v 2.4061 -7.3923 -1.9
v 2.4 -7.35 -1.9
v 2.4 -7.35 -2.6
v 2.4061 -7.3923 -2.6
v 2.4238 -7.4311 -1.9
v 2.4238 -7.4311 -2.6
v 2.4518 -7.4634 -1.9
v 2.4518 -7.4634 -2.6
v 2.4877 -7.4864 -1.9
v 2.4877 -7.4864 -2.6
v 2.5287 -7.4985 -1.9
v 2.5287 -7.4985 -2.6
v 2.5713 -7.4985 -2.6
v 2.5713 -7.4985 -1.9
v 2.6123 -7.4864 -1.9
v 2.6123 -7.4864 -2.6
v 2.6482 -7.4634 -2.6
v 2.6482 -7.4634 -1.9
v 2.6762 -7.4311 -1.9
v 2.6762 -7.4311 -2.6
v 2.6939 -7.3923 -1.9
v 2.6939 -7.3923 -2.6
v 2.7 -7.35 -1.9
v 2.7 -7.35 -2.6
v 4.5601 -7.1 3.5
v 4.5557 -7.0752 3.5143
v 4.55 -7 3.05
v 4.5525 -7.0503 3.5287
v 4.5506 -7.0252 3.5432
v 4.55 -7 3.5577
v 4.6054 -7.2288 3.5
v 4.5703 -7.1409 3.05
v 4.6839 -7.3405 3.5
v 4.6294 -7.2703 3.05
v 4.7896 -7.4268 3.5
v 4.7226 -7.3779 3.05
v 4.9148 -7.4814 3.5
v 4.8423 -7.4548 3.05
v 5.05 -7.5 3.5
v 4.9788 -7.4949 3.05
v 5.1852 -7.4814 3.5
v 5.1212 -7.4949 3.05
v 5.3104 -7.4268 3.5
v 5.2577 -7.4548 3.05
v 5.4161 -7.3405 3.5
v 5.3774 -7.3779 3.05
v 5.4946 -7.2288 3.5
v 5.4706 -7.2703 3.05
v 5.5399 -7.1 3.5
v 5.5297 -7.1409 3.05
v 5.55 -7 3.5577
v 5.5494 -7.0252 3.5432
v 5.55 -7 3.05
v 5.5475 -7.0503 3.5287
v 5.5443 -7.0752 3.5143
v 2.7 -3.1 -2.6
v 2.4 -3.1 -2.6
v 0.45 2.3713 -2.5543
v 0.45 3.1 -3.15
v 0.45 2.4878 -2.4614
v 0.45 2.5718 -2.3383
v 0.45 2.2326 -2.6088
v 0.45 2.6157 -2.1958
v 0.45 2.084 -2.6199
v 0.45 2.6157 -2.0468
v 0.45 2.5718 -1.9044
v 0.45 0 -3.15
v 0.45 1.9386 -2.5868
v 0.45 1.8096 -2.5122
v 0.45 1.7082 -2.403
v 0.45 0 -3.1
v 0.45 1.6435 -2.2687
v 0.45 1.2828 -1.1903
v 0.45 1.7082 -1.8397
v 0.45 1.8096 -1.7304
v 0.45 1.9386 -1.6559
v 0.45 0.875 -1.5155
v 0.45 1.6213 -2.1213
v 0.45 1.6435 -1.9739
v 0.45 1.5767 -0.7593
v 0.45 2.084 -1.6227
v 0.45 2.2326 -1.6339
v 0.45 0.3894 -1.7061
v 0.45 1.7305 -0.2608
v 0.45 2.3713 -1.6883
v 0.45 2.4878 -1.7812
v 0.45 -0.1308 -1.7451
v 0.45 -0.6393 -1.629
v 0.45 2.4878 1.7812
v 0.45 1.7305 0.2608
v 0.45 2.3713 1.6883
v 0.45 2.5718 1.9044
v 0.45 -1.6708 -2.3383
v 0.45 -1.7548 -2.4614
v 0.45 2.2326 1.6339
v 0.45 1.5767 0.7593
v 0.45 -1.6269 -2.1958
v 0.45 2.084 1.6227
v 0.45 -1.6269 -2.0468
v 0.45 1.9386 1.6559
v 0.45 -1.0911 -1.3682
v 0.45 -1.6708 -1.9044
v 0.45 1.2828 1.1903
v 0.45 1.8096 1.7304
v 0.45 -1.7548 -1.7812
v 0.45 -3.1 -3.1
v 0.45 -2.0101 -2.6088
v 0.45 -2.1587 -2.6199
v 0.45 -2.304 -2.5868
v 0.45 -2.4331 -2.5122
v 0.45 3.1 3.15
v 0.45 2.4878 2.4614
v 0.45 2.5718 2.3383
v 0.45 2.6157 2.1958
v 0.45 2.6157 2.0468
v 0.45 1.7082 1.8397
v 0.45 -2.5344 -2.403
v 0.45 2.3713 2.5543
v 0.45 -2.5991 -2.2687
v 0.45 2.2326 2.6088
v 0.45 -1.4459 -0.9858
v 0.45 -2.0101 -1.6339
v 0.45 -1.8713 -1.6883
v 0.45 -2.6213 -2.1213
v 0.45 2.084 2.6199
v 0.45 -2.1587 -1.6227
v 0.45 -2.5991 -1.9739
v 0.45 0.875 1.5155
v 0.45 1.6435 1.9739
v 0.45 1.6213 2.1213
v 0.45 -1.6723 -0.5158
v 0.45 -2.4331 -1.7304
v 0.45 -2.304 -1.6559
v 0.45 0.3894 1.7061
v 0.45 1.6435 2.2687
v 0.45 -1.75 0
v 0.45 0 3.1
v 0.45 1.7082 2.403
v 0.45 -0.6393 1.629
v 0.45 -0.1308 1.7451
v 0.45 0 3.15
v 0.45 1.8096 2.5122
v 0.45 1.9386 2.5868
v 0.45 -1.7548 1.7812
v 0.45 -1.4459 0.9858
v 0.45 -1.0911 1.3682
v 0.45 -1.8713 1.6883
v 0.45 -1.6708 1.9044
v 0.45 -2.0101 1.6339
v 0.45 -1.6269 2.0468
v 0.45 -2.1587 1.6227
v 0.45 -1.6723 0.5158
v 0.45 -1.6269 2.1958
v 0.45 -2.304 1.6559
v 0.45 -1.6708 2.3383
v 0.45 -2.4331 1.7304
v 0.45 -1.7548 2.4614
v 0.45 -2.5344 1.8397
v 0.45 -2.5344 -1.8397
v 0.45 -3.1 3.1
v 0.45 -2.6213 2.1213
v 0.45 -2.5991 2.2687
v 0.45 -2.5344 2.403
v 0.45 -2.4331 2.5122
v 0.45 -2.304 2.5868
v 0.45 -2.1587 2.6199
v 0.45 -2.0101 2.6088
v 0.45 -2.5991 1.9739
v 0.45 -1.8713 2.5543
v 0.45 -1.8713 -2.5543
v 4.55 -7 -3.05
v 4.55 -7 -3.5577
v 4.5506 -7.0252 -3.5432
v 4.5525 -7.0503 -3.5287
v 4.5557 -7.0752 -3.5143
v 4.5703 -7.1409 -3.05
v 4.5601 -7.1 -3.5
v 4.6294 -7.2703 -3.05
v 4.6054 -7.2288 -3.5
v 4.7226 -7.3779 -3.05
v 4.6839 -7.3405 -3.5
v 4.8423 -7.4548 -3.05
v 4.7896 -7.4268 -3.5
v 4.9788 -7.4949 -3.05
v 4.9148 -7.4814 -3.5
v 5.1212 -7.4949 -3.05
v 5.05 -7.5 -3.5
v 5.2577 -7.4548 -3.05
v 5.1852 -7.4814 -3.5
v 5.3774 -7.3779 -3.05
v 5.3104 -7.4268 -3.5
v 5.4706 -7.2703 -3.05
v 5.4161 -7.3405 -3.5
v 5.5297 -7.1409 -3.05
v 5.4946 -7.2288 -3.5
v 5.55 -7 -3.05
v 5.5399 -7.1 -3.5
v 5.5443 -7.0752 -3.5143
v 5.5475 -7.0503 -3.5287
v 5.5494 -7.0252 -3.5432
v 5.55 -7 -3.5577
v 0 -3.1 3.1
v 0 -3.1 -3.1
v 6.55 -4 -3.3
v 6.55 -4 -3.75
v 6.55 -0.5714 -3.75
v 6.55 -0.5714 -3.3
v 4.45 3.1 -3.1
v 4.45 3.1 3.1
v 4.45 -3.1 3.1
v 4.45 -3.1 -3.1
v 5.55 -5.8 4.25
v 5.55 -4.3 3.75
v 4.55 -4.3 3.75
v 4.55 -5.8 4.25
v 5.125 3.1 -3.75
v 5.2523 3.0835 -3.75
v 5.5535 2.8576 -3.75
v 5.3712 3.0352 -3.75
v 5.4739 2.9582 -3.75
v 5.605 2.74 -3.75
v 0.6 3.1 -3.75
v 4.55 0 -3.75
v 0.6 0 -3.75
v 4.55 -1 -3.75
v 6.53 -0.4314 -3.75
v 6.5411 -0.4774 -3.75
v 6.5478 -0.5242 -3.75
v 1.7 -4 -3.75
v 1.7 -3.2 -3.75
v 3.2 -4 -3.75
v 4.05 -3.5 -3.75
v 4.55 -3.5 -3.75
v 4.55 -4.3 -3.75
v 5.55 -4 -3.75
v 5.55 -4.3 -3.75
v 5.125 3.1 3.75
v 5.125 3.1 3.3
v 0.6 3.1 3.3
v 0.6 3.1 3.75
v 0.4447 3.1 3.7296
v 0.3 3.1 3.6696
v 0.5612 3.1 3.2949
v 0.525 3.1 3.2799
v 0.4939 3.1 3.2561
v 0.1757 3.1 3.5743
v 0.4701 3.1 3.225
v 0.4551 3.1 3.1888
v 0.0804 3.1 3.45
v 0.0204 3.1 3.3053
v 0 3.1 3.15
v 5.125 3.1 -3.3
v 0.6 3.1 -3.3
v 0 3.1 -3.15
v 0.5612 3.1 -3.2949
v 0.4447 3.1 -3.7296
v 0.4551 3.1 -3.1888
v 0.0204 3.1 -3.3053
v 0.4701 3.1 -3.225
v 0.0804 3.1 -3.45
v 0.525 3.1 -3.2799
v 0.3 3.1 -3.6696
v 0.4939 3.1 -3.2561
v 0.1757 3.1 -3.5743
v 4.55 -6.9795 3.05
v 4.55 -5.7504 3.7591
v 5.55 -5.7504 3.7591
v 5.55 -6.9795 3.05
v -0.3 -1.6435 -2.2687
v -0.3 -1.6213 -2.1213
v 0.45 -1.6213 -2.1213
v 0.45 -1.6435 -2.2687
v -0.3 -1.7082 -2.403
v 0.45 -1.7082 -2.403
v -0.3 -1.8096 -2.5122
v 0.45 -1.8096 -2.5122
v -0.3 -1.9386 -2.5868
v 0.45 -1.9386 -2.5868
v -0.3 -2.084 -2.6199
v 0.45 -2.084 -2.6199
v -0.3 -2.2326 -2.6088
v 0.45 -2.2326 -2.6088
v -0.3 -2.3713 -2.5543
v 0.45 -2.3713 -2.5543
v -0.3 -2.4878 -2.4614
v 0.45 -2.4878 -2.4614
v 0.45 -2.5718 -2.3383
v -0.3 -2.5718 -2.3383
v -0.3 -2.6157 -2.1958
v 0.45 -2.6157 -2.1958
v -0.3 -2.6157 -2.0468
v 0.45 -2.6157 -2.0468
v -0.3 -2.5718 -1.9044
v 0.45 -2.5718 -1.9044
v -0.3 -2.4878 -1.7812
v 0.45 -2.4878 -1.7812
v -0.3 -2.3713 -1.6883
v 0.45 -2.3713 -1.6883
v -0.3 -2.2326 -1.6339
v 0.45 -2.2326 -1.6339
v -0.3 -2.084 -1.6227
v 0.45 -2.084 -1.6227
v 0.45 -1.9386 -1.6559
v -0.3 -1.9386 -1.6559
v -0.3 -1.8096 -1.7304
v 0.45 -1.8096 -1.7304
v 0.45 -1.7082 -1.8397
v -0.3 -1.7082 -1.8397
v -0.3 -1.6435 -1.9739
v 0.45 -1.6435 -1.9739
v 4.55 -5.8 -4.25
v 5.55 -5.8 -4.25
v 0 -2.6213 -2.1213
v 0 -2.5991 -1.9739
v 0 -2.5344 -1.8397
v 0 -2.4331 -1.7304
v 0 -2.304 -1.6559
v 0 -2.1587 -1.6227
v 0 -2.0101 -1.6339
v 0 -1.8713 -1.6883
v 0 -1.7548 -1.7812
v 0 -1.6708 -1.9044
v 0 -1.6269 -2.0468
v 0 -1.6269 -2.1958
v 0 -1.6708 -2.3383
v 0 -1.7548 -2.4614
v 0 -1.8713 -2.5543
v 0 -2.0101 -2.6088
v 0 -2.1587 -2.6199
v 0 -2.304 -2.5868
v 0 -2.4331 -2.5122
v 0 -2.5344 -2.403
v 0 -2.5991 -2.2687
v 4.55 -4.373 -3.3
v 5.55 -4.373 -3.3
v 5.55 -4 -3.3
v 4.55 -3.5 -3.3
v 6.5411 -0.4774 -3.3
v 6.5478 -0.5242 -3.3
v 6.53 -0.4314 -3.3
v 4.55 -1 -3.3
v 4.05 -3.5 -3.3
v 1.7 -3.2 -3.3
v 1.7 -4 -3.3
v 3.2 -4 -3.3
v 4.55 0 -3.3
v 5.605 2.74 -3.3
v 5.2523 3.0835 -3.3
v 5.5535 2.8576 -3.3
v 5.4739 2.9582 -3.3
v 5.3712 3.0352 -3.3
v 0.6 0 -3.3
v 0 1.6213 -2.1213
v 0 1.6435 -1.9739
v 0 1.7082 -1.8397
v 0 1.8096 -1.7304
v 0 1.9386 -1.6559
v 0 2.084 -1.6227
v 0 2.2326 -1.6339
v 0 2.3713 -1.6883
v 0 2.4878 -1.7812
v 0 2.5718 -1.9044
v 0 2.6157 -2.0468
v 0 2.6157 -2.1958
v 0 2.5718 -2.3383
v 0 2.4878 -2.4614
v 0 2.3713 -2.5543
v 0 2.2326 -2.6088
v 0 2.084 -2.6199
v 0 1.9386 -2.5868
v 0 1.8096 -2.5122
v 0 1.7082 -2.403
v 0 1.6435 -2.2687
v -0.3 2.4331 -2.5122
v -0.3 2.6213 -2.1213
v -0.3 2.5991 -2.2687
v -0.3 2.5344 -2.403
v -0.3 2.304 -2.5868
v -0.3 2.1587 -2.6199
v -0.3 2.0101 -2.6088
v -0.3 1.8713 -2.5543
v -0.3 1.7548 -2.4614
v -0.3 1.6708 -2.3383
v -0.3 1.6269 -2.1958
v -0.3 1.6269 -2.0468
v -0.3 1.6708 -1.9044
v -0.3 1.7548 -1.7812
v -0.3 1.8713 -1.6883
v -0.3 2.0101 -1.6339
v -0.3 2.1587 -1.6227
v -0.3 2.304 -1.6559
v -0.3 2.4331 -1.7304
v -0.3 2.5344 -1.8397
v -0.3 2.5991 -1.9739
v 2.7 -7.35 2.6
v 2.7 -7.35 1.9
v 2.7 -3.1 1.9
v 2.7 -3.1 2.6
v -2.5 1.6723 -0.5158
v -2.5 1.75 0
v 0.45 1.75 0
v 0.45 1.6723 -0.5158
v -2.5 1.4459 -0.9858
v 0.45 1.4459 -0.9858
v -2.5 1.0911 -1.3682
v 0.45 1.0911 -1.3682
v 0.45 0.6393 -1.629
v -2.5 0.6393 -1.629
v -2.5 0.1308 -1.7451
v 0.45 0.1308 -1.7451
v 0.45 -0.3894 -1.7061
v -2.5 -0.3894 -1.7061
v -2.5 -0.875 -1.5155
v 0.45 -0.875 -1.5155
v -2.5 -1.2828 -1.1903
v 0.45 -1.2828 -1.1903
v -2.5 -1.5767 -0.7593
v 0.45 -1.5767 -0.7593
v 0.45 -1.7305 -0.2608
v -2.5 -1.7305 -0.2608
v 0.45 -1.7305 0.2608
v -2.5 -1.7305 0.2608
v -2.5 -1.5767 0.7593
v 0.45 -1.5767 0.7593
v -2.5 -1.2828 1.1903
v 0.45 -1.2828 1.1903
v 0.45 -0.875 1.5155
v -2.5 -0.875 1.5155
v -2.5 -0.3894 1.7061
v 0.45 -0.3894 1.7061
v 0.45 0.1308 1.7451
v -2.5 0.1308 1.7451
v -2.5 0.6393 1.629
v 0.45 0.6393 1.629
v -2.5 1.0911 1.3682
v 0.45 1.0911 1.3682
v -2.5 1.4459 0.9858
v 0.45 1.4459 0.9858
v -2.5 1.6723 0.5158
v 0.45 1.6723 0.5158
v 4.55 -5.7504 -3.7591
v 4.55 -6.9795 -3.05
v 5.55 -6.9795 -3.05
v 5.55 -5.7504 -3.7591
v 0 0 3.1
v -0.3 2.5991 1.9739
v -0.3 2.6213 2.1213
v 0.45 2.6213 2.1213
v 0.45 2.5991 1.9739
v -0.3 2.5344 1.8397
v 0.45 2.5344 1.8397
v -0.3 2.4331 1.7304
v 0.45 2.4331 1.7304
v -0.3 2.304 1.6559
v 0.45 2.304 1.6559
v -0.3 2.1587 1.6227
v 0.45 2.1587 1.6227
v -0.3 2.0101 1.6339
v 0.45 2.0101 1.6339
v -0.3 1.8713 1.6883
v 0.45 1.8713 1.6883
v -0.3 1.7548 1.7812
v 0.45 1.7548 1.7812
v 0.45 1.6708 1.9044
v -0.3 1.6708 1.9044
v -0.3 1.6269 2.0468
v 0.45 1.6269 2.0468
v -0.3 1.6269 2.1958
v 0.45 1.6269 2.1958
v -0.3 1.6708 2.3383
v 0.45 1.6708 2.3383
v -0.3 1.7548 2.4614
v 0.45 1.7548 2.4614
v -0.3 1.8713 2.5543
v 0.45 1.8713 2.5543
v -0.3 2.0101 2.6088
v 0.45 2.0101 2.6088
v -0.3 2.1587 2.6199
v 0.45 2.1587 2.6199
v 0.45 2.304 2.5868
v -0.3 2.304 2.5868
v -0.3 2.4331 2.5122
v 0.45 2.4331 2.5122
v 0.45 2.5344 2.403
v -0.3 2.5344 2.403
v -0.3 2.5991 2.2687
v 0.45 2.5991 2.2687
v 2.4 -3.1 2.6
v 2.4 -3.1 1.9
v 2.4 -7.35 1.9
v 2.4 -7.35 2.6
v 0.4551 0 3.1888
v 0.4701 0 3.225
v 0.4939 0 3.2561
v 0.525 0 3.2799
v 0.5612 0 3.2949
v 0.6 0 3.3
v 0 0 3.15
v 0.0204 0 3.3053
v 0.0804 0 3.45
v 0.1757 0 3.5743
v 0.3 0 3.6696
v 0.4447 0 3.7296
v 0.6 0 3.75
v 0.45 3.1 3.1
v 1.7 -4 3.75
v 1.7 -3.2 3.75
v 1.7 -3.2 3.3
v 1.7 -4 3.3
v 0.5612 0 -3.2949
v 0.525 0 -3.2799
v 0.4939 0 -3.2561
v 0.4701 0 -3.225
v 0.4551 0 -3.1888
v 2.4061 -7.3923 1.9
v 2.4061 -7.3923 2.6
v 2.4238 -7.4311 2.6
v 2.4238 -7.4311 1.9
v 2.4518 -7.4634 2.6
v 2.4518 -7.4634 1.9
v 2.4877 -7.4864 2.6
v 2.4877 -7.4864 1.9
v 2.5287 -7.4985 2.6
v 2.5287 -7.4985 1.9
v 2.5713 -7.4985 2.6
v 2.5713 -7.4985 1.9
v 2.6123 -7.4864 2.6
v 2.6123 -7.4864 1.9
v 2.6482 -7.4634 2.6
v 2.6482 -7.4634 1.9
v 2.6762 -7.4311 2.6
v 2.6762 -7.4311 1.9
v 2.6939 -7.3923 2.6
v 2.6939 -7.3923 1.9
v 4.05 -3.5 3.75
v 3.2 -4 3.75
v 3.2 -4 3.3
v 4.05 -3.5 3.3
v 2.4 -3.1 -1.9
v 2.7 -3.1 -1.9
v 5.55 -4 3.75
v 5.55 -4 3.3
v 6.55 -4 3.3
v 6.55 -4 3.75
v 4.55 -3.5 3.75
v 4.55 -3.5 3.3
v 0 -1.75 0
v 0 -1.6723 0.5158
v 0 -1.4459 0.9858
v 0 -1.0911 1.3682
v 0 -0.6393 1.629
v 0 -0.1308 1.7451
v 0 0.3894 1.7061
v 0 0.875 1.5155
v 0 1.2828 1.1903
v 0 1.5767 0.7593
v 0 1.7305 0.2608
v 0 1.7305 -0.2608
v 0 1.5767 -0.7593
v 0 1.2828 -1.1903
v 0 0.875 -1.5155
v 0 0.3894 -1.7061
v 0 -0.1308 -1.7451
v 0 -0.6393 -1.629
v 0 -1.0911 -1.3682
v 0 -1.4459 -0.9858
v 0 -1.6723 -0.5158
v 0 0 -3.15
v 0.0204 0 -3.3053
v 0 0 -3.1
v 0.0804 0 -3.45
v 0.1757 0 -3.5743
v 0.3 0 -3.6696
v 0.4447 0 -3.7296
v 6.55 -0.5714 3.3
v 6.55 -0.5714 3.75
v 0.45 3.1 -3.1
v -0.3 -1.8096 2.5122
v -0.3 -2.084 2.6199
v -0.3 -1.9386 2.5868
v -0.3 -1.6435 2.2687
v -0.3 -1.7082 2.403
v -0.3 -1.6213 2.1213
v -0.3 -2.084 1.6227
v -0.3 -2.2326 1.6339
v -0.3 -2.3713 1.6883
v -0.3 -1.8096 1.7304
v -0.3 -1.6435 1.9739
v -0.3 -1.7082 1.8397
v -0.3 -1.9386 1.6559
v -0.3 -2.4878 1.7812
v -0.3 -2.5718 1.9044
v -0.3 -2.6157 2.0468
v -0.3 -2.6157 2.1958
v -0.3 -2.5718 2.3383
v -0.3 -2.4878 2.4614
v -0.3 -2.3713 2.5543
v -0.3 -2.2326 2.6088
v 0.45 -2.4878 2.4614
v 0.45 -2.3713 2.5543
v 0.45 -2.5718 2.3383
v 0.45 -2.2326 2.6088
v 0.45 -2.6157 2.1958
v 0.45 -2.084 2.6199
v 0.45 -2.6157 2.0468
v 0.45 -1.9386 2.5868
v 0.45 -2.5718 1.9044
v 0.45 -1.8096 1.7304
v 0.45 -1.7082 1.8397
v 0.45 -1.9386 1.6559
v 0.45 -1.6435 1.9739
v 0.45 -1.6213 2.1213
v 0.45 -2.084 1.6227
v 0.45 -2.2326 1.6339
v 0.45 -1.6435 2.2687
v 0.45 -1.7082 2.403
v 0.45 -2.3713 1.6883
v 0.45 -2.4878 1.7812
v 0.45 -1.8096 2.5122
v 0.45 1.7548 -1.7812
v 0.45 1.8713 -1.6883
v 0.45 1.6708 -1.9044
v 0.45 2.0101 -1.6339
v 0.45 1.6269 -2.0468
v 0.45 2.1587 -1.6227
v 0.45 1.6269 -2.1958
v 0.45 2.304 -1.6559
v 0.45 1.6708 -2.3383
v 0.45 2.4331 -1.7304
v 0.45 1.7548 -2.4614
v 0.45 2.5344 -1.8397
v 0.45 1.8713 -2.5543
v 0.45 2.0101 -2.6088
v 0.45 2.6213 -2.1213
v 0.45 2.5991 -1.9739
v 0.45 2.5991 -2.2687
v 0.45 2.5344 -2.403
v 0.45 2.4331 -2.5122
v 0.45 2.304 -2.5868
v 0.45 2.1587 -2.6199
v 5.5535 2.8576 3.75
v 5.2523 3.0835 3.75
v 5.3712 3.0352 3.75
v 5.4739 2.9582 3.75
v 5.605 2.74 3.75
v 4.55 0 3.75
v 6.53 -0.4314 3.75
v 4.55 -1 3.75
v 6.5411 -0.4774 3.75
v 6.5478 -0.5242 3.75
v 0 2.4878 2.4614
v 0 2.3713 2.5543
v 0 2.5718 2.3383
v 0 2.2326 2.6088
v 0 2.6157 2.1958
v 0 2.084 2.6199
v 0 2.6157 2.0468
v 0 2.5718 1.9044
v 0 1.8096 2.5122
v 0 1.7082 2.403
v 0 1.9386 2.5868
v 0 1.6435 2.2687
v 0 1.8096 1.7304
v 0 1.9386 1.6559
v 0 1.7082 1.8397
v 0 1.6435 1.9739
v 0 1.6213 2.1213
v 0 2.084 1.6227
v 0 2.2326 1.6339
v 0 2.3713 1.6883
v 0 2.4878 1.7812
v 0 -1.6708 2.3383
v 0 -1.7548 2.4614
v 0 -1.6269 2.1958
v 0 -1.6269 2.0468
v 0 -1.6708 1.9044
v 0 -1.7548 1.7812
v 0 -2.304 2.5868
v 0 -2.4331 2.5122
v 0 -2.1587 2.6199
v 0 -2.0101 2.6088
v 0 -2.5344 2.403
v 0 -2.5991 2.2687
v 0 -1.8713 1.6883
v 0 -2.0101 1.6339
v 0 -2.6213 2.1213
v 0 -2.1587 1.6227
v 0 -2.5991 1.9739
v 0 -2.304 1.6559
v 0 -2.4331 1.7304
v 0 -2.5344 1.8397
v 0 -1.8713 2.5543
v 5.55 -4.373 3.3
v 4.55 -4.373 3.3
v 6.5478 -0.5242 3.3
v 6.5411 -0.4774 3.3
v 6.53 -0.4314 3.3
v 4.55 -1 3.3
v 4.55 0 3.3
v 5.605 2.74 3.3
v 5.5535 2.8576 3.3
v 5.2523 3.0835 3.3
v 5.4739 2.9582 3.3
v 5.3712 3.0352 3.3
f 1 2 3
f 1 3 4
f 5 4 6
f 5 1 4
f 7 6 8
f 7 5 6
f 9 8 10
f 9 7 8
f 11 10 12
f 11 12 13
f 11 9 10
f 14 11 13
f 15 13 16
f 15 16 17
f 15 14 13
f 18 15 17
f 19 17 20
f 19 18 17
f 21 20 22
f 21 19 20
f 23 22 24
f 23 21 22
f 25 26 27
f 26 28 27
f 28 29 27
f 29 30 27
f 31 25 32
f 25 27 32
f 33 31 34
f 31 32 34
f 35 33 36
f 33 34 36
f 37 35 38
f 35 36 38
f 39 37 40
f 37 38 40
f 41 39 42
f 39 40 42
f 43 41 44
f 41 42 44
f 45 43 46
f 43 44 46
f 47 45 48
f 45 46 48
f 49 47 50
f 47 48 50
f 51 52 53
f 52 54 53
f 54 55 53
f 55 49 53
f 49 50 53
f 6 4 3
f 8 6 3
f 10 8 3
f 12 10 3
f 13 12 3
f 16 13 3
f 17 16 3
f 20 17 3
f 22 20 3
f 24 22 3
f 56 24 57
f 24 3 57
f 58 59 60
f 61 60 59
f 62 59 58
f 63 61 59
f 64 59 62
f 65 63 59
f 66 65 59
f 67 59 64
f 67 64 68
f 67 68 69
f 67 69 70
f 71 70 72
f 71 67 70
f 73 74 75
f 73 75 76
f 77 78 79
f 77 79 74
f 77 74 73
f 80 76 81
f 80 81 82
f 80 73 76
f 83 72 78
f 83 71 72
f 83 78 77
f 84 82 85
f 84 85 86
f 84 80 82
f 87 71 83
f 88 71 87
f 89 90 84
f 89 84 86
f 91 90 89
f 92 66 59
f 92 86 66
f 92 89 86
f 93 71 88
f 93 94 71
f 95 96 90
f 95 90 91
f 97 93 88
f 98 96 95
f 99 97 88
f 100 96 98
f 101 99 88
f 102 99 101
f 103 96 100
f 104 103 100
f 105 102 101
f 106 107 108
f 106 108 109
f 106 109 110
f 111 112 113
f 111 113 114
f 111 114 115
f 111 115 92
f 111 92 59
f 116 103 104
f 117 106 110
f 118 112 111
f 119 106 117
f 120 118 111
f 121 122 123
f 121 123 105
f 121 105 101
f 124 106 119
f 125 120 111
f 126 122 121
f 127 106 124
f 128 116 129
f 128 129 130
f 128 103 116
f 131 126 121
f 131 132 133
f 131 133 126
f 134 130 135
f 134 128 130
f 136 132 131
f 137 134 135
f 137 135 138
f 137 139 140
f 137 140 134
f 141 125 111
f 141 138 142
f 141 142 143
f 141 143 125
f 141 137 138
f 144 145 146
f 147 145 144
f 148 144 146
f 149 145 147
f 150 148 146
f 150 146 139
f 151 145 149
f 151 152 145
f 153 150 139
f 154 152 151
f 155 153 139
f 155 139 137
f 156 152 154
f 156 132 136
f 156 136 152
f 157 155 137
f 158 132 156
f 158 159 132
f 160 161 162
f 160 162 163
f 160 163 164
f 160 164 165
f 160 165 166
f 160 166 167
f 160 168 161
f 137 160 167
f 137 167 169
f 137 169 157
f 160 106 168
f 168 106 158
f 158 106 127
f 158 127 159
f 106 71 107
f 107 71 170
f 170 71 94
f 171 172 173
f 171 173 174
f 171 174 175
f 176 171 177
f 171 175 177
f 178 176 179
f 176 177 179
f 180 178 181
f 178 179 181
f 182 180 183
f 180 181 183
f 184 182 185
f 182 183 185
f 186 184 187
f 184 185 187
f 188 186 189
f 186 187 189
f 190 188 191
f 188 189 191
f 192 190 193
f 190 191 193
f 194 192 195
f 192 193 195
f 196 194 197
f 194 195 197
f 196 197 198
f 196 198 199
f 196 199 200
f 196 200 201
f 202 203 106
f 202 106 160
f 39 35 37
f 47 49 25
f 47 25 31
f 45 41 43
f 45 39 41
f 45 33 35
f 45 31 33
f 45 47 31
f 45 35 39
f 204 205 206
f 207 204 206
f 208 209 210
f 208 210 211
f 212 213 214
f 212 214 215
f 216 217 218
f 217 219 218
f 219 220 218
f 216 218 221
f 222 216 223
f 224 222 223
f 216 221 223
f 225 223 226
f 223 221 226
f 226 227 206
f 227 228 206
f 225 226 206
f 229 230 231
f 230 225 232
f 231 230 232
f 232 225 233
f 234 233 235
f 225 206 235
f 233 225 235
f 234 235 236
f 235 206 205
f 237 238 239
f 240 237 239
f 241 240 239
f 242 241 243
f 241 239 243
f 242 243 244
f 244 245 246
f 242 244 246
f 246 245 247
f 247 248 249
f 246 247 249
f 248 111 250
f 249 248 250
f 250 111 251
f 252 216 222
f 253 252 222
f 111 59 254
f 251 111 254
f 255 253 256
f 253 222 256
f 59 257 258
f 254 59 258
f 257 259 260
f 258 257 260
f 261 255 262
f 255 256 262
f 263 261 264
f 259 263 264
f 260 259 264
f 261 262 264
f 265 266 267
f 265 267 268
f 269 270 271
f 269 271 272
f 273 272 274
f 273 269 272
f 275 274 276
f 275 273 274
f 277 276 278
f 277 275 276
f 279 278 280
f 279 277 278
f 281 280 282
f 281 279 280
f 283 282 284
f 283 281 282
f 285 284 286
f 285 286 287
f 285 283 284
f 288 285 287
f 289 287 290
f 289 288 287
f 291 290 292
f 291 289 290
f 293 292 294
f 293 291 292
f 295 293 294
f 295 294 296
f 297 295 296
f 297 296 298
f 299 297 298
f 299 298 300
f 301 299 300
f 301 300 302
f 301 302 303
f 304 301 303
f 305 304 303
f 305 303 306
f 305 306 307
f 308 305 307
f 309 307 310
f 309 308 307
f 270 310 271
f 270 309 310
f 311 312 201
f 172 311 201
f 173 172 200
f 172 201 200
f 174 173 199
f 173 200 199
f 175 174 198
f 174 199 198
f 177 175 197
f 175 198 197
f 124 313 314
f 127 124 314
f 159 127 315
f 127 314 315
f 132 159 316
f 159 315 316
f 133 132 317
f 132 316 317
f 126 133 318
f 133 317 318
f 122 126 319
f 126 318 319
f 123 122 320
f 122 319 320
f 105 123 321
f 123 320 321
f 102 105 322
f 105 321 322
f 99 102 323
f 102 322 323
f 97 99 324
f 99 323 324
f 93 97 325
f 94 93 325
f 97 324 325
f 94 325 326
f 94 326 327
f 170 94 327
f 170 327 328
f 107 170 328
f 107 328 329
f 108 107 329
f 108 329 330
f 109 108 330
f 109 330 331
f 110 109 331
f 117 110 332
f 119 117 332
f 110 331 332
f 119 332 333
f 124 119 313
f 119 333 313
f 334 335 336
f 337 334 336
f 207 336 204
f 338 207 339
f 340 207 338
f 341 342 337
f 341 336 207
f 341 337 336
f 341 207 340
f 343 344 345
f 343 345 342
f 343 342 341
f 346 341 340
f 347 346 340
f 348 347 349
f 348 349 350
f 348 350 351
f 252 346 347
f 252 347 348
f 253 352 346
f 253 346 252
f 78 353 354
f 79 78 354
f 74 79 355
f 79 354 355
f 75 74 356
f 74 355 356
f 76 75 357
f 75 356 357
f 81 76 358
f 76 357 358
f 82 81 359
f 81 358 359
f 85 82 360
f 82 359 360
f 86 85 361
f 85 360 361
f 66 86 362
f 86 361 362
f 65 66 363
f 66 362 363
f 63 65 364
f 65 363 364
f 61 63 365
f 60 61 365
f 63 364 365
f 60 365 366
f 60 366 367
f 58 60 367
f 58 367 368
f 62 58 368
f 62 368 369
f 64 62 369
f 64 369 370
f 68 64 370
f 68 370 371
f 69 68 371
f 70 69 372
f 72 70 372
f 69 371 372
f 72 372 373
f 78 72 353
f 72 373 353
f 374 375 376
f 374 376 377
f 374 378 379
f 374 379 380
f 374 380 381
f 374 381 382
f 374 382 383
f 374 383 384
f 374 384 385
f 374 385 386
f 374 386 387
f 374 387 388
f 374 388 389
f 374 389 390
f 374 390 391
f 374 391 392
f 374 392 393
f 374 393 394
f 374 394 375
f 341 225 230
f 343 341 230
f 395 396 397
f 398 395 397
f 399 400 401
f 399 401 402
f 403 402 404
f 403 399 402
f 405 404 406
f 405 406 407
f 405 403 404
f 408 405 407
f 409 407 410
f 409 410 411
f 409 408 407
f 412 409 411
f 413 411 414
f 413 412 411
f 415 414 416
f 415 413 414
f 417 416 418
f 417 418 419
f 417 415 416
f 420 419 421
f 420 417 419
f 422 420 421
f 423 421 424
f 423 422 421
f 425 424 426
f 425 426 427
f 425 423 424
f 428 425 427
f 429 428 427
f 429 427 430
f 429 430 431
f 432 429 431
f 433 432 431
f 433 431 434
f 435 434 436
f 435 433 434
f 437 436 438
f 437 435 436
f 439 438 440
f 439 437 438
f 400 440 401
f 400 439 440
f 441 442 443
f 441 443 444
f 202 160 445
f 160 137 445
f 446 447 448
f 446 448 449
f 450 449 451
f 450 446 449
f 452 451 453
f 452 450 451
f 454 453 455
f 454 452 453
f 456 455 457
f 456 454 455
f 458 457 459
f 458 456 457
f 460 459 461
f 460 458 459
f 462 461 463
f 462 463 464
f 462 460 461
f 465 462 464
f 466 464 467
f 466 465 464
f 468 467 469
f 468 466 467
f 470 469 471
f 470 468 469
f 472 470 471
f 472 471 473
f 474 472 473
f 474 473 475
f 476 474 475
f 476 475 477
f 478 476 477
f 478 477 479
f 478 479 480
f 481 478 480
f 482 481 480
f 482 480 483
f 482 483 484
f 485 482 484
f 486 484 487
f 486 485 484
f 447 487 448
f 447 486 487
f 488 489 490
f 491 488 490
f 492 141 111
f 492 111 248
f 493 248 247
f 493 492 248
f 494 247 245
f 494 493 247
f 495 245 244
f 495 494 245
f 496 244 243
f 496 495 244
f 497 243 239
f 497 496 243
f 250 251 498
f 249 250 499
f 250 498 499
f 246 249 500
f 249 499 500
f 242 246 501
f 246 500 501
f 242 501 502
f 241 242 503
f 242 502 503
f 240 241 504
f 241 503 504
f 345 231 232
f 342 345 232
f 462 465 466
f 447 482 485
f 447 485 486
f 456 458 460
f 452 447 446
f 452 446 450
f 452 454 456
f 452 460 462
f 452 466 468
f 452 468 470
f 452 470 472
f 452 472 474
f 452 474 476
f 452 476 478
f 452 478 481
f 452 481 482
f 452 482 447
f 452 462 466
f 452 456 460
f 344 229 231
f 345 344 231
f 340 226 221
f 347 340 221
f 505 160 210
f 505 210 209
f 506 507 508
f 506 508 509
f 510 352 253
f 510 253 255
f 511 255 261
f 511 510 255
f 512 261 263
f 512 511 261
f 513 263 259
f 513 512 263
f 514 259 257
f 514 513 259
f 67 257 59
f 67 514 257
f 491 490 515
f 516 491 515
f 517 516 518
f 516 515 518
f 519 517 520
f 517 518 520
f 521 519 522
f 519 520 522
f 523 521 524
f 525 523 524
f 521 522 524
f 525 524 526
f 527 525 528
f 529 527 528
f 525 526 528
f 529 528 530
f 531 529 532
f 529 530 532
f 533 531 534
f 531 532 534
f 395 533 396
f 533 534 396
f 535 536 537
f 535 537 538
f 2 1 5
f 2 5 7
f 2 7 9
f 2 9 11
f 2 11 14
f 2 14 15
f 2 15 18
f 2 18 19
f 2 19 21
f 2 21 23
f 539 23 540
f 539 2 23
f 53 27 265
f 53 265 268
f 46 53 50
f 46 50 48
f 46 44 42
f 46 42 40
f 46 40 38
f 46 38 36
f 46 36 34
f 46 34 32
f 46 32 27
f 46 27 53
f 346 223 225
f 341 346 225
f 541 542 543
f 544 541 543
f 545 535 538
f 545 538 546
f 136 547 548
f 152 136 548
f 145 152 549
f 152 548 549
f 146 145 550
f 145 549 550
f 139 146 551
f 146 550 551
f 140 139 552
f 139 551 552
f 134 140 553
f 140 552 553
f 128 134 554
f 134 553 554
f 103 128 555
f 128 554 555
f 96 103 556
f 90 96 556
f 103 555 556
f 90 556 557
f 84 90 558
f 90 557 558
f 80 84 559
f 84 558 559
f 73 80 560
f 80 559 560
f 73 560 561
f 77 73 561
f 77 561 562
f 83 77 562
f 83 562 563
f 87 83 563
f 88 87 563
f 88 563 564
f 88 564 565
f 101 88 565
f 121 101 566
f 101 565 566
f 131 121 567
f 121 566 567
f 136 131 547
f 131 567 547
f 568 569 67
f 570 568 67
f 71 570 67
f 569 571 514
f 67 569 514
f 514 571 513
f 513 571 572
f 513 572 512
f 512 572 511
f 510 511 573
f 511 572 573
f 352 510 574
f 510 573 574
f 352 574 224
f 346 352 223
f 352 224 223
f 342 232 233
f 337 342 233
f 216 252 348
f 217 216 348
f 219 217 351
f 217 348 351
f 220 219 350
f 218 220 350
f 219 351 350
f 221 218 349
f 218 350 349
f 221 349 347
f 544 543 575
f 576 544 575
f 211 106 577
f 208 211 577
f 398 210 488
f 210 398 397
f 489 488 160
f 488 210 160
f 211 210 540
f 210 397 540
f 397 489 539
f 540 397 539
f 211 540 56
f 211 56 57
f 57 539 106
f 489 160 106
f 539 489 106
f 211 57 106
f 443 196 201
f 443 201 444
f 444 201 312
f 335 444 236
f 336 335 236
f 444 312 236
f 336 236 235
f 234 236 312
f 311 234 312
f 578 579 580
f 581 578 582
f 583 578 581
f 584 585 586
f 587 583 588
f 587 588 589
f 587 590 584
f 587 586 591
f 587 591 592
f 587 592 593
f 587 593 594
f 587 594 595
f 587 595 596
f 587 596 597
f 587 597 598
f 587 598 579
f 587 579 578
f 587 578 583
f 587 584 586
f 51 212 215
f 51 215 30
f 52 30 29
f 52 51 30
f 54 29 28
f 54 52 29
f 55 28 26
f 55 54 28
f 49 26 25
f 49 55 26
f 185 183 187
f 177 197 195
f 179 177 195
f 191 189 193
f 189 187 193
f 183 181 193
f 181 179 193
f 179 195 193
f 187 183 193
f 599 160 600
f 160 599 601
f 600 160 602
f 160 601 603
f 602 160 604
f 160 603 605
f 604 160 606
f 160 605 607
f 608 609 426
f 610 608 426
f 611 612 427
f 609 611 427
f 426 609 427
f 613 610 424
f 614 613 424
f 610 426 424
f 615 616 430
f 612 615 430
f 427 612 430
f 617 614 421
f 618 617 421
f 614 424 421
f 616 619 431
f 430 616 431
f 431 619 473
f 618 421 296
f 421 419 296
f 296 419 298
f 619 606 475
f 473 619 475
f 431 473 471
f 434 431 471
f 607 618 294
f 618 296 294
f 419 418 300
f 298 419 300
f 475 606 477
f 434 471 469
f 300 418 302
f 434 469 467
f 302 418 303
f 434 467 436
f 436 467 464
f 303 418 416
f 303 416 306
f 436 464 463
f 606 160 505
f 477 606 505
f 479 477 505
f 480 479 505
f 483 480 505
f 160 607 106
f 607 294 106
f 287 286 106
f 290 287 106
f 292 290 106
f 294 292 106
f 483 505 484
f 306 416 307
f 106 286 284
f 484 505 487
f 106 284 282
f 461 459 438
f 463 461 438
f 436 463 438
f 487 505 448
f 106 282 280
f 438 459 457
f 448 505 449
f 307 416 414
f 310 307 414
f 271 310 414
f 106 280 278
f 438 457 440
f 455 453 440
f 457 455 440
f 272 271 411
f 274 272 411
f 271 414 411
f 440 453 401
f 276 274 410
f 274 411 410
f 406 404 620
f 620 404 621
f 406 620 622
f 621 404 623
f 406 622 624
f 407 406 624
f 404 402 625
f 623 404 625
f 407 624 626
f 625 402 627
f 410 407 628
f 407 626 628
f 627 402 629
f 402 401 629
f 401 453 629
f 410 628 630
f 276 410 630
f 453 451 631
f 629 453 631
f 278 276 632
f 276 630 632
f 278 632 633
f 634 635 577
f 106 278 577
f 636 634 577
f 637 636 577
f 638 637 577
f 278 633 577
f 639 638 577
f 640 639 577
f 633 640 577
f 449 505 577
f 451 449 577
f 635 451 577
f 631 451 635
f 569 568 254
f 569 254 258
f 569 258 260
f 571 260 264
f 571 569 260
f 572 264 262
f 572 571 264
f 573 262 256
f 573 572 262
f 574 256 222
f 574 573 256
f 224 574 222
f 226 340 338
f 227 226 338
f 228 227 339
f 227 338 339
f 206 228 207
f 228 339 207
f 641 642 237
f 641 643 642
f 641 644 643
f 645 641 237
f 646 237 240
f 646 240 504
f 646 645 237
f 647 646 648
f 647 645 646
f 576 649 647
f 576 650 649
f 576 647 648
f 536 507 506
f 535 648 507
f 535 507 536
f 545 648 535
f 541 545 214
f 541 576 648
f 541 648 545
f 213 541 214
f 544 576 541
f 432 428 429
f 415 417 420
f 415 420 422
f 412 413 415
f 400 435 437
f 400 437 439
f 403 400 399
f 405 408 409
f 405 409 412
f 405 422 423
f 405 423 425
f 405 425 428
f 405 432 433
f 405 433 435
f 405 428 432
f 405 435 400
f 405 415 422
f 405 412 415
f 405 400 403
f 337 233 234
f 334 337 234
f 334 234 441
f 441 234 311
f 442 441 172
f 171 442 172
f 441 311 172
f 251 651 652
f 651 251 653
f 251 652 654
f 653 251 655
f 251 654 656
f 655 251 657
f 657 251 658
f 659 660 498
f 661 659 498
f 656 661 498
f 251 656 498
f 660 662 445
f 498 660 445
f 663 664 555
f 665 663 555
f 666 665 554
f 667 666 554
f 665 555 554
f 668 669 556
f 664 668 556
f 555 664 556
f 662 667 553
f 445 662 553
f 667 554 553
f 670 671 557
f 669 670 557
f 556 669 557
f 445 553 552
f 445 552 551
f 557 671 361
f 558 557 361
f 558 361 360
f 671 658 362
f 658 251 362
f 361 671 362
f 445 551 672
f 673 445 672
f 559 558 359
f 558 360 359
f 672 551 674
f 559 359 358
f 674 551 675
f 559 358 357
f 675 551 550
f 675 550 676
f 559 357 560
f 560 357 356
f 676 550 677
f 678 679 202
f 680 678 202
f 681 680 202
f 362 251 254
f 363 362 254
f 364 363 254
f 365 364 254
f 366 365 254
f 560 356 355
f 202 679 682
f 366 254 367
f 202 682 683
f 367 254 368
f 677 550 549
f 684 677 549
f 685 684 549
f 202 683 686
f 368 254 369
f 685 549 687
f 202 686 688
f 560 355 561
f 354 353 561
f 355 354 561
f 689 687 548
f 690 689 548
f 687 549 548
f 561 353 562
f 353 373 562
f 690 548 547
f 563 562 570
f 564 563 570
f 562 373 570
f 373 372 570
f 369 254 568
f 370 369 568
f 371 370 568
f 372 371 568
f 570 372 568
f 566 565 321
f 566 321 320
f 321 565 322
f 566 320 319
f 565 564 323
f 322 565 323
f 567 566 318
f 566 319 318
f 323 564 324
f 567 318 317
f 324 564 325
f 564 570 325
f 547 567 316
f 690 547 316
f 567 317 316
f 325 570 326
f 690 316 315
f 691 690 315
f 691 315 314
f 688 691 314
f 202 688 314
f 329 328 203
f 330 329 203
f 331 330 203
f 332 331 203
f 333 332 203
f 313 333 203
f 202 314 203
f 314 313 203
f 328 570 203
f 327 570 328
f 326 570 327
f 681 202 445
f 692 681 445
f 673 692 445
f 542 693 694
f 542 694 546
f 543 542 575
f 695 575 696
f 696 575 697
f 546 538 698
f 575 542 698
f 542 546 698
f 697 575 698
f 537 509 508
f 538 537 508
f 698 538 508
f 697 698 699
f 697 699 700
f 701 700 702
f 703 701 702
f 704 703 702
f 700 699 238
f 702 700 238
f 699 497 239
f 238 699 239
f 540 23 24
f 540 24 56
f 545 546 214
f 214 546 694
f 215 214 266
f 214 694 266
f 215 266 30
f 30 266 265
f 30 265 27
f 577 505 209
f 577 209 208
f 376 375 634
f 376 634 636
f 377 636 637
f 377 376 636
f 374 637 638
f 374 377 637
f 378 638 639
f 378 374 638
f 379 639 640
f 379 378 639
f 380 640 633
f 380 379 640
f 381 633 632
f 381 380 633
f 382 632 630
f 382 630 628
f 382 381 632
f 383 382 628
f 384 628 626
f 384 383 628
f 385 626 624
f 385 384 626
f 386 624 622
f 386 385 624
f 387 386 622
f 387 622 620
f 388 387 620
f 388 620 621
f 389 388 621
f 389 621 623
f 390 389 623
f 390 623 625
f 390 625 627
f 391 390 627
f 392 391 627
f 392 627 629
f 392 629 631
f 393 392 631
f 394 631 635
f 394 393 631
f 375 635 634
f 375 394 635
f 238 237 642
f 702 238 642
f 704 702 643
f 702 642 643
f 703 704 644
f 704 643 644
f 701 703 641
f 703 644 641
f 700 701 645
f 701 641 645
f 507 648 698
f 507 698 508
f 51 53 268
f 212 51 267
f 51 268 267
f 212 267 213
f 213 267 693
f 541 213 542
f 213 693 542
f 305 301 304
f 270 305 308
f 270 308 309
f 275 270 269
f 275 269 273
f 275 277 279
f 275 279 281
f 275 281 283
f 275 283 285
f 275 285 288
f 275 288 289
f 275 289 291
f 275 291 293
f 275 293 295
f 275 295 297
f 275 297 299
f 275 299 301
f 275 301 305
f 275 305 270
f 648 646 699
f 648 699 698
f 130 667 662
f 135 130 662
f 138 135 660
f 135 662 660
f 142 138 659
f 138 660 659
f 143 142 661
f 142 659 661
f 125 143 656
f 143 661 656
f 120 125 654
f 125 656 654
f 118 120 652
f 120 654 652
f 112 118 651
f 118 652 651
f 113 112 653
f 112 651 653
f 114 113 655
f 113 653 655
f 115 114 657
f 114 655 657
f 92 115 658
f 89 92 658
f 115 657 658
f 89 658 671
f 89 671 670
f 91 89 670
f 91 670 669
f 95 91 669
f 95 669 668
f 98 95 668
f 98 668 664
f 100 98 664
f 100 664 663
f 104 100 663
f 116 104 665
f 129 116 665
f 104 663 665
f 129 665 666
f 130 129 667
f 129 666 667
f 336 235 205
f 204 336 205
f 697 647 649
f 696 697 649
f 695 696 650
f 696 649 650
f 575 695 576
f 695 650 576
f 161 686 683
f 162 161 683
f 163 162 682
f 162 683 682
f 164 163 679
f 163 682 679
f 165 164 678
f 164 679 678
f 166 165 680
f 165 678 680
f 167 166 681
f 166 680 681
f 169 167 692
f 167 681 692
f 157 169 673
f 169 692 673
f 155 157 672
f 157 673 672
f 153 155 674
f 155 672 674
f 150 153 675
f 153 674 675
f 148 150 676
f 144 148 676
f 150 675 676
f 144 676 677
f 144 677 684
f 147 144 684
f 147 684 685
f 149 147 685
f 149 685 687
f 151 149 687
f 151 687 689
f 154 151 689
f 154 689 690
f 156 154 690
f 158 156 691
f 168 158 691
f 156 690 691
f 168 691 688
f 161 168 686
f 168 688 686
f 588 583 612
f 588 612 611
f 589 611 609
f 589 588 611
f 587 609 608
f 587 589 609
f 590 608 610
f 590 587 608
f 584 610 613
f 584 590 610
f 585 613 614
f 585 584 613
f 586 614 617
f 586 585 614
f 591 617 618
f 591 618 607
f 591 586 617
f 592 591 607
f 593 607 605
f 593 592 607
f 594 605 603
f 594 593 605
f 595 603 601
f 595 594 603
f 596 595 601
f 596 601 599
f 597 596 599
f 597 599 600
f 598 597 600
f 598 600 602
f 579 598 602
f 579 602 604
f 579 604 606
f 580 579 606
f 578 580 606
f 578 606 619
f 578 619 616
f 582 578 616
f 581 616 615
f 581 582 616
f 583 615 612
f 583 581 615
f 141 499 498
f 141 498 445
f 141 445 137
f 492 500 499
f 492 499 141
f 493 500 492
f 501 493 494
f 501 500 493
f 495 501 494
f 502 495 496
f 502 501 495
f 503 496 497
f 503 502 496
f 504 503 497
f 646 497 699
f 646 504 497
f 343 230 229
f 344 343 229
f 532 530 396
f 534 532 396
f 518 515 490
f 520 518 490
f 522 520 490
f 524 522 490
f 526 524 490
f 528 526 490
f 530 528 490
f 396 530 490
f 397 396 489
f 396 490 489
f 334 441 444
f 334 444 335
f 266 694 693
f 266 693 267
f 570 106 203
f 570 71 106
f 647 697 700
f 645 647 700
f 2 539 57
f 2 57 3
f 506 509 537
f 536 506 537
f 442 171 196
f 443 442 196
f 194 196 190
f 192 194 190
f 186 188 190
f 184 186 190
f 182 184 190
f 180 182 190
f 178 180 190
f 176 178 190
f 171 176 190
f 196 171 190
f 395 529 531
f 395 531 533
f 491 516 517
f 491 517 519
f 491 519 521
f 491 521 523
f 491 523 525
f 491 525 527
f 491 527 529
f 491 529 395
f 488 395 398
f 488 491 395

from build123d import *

# Parameters (mm, degrees)
EXTRUDE_1_DEPTH      = 10
EXTRUDE_1_DEPTH_BACK = 10
CUT_EXTRUDE_1_DEPTH  = 15.112140164
FILLET_1_R           = 0.6
FILLET_2_R           = 0.5
SHELL_START          = 0.6
SHELL_1_OUTLINE_W    = 7.1
SHELL_1_OUTLINE_H    = 6.6
SHELL_1_DEPTH        = 5.95
SHELL_START_2        = -8
SHELL_1_2_OUTLINE_W  = 1
SHELL_1_2_OUTLINE_H  = 6.1
SHELL_1_2_DEPTH      = 11.1
SHELL_START_3        = 4.55
SHELL_1_3_DEPTH      = 1
CUT_EXTRUDE_2_DEPTH  = 0.65
SKETCH_5_R           = 0.5
SKETCH_5_R_2         = 1.75
SKETCH_5_W           = 10
SKETCH_5_H           = 2
CUT_EXTRUDE_3_DEPTH  = 0.45
SKETCH_6_W           = 6.2
SKETCH_6_H           = 6.2
EXTRUDE_2_DEPTH      = 4
SKETCH_7_W           = 0.7
SKETCH_7_H           = 5
EXTRUDE_1_2_DEPTH    = 4
SKETCH_8_OUTSIDE_W   = 11.61
SKETCH_8_OUTSIDE_H   = 15.96
CUT_EXTRUDE_4_DEPTH  = 4
EXTRUDE_START        = 0.75
SKETCH_9_R           = 0.5
EXTRUDE_3_DEPTH      = 0.75
EXTRUDE_START_2      = 2.95
SKETCH_9_4_R         = 1.75
EXTRUDE_4_DEPTH      = 2.95


with BuildPart() as part:
    # 草图1 → Extrude 1 (new, two sides: drawn at the far end of the back side and taken through both)
    with BuildSketch(Plane.XY.offset(-EXTRUDE_1_DEPTH_BACK)):
        with BuildLine():
            Line((0, 3.1), (0, -3.1))
            Line((0, -3.1), (0, -4))
            Line((0, -4), (2.4, -4))
            Line((2.4, -4), (2.7, -4))
            Line((2.7, -4), (4.55, -4))
            Line((4.55, -4), (4.55, -7))
            ThreePointArc((4.55, -7), (5.05, -7.5), (5.55, -7))
            Line((5.55, -7), (5.55, -4))
            Line((5.55, -4), (6.55, -4))
            Line((6.55, -4), (6.55, -0.5))
            Line((6.55, -0.5), (5.5, 3.1))
            Line((5.5, 3.1), (0, 3.1))
        make_face()
    extrude(amount=EXTRUDE_1_DEPTH + EXTRUDE_1_DEPTH_BACK)

    # 草图2 → 切除-拉伸1 (cut, symmetric)
    with BuildSketch(Plane(origin=(0, 0, 0), x_dir=(0, 0, -1), z_dir=(1, 0, 0))):
        Polygon((3.75, 49.345660633), (3.75, 3.778219056), (3.75, -4.3), (4.25, -5.8), (3.5, -7.1), (3.5, -7.992367687), (3.5, -53.559809264), (94.634614214, -53.781212981), (94.884614214, 49.124256916), align=None)
    cut_extrude_1 = extrude(amount=CUT_EXTRUDE_1_DEPTH, both=True, mode=Mode.SUBTRACT)

    # 镜向1: 切除-拉伸1 across plane
    add(cut_extrude_1.mirror(Plane.XY), mode=Mode.SUBTRACT)

    # 圆角1
    fillet_1_edges = [part.edges().sort_by_distance(p)[0] for p in [
        (0, -0.45, -3.75),
        (0, -0.45, 3.75),
    ]]
    fillet(fillet_1_edges, radius=FILLET_1_R)

    # 圆角2
    fillet_2_edges = [part.edges().sort_by_distance(p)[0] for p in [
        (6.55, -0.5, 0),
        (5.5, 3.1, 0),
    ]]
    fillet(fillet_2_edges, radius=FILLET_2_R)

    # 抽壳1: read off the stored shape, not the designer's step
    # 抽壳1 outline → 抽壳1 (cut)
    with BuildSketch(Plane.YZ.offset(SHELL_START)):
        with Locations((-0.45, 0)):
            Rectangle(SHELL_1_OUTLINE_W, SHELL_1_OUTLINE_H)
    extrude(amount=SHELL_1_DEPTH, mode=Mode.SUBTRACT)

    # Shell 1 2 outline → Shell 1 2 (cut)
    with BuildSketch(Plane(origin=(0, 0, 0), x_dir=(1, 0, 0), z_dir=(0, 1, 0)).offset(SHELL_START_2)):
        with BuildLine():
            ThreePointArc((0.6, 3.3), (0.493933983, 3.256066017), (0.45, 3.15))
            Line((0.45, 3.15), (0.45, -3.15))
            ThreePointArc((0.45, -3.15), (0.493933983, -3.256066017), (0.6, -3.3))
            Line((0.6, -3.3), (0.6, 3.3))
        make_face()
        with Locations((5.05, 0)):
            Rectangle(SHELL_1_2_OUTLINE_W, SHELL_1_2_OUTLINE_H)
    extrude(amount=SHELL_1_2_DEPTH, mode=Mode.SUBTRACT)

    # Shell 1 3 outline → Shell 1 3 (cut)
    with BuildSketch(Plane.YZ.offset(SHELL_START_3)):
        Polygon((-6.979500139, -3.05), (-5.750368378, -3.759114477), (-4.373024947, -3.3), (-4, -3.3), (-4, -3.05), align=None)
        Polygon((-4.373024947, 3.3), (-5.750368378, 3.759114477), (-6.979500139, 3.05), (-4, 3.05), (-4, 3.3), align=None)
    extrude(amount=SHELL_1_3_DEPTH, mode=Mode.SUBTRACT)

    # 草图4 → 切除-拉伸2 (cut)
    with BuildSketch(Plane.XY.offset(3.75)):
        Polygon((-1.45, 0), (4.55, 0), (4.55, -1), (1.7, -3.2), (1.7, -4), (3.2, -4), (4.05, -3.5), (4.55, -3.5), (4.55, -9.5), (-1.45, -9.5), align=None)
    cut_extrude_2 = extrude(amount=-CUT_EXTRUDE_2_DEPTH, mode=Mode.SUBTRACT)

    # 镜向2: 切除-拉伸2 across plane
    add(cut_extrude_2.mirror(Plane.XY), mode=Mode.SUBTRACT)

    # 草图5 → 切除-拉伸3 (cut)
    with BuildSketch(Plane.ZY):
        with Locations(Location((-2.121320344, 2.121320344, 0), (0, 0, 270))):
            Circle(SKETCH_5_R)
        with Locations(Location((2.121320344, 2.121320344, 0), (0, 0, 270))):
            Circle(SKETCH_5_R)
        with Locations(Location((2.121320344, -2.121320344, 0), (0, 0, 270))):
            Circle(SKETCH_5_R)
        with Locations(Location((-2.121320344, -2.121320344, 0), (0, 0, 270))):
            Circle(SKETCH_5_R)
        with Locations(Location((0, 0, 0), (0, 0, 270))):
            Circle(SKETCH_5_R_2)
        with Locations((0, -4.1)):
            Rectangle(SKETCH_5_W, SKETCH_5_H)
    extrude(amount=-CUT_EXTRUDE_3_DEPTH, mode=Mode.SUBTRACT)


with BuildPart() as body_2:
    # 草图6 → 凸台-拉伸2 (new body)
    with BuildSketch(Plane(origin=(0.45, 0, 0), x_dir=(0, 0, -1), z_dir=(1, 0, 0))):
        Rectangle(SKETCH_6_W, SKETCH_6_H)
    extrude(amount=EXTRUDE_2_DEPTH)


with BuildPart() as body_3:
    # 草图7 → Extrude 1 2 (new body)
    with BuildSketch(Plane(origin=(0, 0, 0), x_dir=(0, 0, -1), z_dir=(1, 0, 0))):
        with Locations((2.25, -5.3)):
            Rectangle(SKETCH_7_W, SKETCH_7_H)
    extrude(amount=EXTRUDE_1_2_DEPTH)

    # 草图8 outside → 切除-拉伸4 (cut)
    with BuildSketch(Plane.XY):
        with Locations((3.275, -2.35)):
            Rectangle(SKETCH_8_OUTSIDE_W, SKETCH_8_OUTSIDE_H)
        with BuildLine():
            Line((2.7, -7.35), (2.7, -1.755439518))
            Line((2.7, -1.755439518), (2.4, -1.755439518))
            Line((2.4, -1.755439518), (2.4, -7.35))
            ThreePointArc((2.4, -7.35), (2.55, -7.5), (2.7, -7.35))
        make_face(mode=Mode.SUBTRACT)
    extrude(amount=-CUT_EXTRUDE_4_DEPTH, mode=Mode.SUBTRACT)


with BuildPart() as body_4:
    # 镜向3: mirrored copy
    add(body_3.part.mirror(Plane.XY))


with BuildPart() as body_3_1:
    add(body_3.part)

    # Combine 1: union body 4, body 2
    add(body_4.part)
    add(body_2.part)

    # 草图9 → 凸台-拉伸3 (add)
    with BuildSketch(Plane.ZY.offset(-0.45).offset(EXTRUDE_START)):
        with Locations(Location((-2.121320344, 2.121320344, 0), (0, 0, 90))):
            Circle(SKETCH_9_R)
        with Locations(Location((2.121320344, 2.121320344, 0), (0, 0, 90))):
            Circle(SKETCH_9_R)
        with Locations(Location((2.121320344, -2.121320344, 0), (0, 0, 90))):
            Circle(SKETCH_9_R)
        with Locations(Location((-2.121320344, -2.121320344, 0), (0, 0, 90))):
            Circle(SKETCH_9_R)
    extrude(amount=-EXTRUDE_3_DEPTH)

    # 草图9<4> → 凸台-拉伸4 (add)
    with BuildSketch(Plane.ZY.offset(-0.45).offset(EXTRUDE_START_2)):
        with Locations(Location((0, 0, 0), (0, 0, 90))):
            Circle(SKETCH_9_4_R)
    extrude(amount=-EXTRUDE_4_DEPTH)


solid = Compound([part.part, body_3_1.part])
